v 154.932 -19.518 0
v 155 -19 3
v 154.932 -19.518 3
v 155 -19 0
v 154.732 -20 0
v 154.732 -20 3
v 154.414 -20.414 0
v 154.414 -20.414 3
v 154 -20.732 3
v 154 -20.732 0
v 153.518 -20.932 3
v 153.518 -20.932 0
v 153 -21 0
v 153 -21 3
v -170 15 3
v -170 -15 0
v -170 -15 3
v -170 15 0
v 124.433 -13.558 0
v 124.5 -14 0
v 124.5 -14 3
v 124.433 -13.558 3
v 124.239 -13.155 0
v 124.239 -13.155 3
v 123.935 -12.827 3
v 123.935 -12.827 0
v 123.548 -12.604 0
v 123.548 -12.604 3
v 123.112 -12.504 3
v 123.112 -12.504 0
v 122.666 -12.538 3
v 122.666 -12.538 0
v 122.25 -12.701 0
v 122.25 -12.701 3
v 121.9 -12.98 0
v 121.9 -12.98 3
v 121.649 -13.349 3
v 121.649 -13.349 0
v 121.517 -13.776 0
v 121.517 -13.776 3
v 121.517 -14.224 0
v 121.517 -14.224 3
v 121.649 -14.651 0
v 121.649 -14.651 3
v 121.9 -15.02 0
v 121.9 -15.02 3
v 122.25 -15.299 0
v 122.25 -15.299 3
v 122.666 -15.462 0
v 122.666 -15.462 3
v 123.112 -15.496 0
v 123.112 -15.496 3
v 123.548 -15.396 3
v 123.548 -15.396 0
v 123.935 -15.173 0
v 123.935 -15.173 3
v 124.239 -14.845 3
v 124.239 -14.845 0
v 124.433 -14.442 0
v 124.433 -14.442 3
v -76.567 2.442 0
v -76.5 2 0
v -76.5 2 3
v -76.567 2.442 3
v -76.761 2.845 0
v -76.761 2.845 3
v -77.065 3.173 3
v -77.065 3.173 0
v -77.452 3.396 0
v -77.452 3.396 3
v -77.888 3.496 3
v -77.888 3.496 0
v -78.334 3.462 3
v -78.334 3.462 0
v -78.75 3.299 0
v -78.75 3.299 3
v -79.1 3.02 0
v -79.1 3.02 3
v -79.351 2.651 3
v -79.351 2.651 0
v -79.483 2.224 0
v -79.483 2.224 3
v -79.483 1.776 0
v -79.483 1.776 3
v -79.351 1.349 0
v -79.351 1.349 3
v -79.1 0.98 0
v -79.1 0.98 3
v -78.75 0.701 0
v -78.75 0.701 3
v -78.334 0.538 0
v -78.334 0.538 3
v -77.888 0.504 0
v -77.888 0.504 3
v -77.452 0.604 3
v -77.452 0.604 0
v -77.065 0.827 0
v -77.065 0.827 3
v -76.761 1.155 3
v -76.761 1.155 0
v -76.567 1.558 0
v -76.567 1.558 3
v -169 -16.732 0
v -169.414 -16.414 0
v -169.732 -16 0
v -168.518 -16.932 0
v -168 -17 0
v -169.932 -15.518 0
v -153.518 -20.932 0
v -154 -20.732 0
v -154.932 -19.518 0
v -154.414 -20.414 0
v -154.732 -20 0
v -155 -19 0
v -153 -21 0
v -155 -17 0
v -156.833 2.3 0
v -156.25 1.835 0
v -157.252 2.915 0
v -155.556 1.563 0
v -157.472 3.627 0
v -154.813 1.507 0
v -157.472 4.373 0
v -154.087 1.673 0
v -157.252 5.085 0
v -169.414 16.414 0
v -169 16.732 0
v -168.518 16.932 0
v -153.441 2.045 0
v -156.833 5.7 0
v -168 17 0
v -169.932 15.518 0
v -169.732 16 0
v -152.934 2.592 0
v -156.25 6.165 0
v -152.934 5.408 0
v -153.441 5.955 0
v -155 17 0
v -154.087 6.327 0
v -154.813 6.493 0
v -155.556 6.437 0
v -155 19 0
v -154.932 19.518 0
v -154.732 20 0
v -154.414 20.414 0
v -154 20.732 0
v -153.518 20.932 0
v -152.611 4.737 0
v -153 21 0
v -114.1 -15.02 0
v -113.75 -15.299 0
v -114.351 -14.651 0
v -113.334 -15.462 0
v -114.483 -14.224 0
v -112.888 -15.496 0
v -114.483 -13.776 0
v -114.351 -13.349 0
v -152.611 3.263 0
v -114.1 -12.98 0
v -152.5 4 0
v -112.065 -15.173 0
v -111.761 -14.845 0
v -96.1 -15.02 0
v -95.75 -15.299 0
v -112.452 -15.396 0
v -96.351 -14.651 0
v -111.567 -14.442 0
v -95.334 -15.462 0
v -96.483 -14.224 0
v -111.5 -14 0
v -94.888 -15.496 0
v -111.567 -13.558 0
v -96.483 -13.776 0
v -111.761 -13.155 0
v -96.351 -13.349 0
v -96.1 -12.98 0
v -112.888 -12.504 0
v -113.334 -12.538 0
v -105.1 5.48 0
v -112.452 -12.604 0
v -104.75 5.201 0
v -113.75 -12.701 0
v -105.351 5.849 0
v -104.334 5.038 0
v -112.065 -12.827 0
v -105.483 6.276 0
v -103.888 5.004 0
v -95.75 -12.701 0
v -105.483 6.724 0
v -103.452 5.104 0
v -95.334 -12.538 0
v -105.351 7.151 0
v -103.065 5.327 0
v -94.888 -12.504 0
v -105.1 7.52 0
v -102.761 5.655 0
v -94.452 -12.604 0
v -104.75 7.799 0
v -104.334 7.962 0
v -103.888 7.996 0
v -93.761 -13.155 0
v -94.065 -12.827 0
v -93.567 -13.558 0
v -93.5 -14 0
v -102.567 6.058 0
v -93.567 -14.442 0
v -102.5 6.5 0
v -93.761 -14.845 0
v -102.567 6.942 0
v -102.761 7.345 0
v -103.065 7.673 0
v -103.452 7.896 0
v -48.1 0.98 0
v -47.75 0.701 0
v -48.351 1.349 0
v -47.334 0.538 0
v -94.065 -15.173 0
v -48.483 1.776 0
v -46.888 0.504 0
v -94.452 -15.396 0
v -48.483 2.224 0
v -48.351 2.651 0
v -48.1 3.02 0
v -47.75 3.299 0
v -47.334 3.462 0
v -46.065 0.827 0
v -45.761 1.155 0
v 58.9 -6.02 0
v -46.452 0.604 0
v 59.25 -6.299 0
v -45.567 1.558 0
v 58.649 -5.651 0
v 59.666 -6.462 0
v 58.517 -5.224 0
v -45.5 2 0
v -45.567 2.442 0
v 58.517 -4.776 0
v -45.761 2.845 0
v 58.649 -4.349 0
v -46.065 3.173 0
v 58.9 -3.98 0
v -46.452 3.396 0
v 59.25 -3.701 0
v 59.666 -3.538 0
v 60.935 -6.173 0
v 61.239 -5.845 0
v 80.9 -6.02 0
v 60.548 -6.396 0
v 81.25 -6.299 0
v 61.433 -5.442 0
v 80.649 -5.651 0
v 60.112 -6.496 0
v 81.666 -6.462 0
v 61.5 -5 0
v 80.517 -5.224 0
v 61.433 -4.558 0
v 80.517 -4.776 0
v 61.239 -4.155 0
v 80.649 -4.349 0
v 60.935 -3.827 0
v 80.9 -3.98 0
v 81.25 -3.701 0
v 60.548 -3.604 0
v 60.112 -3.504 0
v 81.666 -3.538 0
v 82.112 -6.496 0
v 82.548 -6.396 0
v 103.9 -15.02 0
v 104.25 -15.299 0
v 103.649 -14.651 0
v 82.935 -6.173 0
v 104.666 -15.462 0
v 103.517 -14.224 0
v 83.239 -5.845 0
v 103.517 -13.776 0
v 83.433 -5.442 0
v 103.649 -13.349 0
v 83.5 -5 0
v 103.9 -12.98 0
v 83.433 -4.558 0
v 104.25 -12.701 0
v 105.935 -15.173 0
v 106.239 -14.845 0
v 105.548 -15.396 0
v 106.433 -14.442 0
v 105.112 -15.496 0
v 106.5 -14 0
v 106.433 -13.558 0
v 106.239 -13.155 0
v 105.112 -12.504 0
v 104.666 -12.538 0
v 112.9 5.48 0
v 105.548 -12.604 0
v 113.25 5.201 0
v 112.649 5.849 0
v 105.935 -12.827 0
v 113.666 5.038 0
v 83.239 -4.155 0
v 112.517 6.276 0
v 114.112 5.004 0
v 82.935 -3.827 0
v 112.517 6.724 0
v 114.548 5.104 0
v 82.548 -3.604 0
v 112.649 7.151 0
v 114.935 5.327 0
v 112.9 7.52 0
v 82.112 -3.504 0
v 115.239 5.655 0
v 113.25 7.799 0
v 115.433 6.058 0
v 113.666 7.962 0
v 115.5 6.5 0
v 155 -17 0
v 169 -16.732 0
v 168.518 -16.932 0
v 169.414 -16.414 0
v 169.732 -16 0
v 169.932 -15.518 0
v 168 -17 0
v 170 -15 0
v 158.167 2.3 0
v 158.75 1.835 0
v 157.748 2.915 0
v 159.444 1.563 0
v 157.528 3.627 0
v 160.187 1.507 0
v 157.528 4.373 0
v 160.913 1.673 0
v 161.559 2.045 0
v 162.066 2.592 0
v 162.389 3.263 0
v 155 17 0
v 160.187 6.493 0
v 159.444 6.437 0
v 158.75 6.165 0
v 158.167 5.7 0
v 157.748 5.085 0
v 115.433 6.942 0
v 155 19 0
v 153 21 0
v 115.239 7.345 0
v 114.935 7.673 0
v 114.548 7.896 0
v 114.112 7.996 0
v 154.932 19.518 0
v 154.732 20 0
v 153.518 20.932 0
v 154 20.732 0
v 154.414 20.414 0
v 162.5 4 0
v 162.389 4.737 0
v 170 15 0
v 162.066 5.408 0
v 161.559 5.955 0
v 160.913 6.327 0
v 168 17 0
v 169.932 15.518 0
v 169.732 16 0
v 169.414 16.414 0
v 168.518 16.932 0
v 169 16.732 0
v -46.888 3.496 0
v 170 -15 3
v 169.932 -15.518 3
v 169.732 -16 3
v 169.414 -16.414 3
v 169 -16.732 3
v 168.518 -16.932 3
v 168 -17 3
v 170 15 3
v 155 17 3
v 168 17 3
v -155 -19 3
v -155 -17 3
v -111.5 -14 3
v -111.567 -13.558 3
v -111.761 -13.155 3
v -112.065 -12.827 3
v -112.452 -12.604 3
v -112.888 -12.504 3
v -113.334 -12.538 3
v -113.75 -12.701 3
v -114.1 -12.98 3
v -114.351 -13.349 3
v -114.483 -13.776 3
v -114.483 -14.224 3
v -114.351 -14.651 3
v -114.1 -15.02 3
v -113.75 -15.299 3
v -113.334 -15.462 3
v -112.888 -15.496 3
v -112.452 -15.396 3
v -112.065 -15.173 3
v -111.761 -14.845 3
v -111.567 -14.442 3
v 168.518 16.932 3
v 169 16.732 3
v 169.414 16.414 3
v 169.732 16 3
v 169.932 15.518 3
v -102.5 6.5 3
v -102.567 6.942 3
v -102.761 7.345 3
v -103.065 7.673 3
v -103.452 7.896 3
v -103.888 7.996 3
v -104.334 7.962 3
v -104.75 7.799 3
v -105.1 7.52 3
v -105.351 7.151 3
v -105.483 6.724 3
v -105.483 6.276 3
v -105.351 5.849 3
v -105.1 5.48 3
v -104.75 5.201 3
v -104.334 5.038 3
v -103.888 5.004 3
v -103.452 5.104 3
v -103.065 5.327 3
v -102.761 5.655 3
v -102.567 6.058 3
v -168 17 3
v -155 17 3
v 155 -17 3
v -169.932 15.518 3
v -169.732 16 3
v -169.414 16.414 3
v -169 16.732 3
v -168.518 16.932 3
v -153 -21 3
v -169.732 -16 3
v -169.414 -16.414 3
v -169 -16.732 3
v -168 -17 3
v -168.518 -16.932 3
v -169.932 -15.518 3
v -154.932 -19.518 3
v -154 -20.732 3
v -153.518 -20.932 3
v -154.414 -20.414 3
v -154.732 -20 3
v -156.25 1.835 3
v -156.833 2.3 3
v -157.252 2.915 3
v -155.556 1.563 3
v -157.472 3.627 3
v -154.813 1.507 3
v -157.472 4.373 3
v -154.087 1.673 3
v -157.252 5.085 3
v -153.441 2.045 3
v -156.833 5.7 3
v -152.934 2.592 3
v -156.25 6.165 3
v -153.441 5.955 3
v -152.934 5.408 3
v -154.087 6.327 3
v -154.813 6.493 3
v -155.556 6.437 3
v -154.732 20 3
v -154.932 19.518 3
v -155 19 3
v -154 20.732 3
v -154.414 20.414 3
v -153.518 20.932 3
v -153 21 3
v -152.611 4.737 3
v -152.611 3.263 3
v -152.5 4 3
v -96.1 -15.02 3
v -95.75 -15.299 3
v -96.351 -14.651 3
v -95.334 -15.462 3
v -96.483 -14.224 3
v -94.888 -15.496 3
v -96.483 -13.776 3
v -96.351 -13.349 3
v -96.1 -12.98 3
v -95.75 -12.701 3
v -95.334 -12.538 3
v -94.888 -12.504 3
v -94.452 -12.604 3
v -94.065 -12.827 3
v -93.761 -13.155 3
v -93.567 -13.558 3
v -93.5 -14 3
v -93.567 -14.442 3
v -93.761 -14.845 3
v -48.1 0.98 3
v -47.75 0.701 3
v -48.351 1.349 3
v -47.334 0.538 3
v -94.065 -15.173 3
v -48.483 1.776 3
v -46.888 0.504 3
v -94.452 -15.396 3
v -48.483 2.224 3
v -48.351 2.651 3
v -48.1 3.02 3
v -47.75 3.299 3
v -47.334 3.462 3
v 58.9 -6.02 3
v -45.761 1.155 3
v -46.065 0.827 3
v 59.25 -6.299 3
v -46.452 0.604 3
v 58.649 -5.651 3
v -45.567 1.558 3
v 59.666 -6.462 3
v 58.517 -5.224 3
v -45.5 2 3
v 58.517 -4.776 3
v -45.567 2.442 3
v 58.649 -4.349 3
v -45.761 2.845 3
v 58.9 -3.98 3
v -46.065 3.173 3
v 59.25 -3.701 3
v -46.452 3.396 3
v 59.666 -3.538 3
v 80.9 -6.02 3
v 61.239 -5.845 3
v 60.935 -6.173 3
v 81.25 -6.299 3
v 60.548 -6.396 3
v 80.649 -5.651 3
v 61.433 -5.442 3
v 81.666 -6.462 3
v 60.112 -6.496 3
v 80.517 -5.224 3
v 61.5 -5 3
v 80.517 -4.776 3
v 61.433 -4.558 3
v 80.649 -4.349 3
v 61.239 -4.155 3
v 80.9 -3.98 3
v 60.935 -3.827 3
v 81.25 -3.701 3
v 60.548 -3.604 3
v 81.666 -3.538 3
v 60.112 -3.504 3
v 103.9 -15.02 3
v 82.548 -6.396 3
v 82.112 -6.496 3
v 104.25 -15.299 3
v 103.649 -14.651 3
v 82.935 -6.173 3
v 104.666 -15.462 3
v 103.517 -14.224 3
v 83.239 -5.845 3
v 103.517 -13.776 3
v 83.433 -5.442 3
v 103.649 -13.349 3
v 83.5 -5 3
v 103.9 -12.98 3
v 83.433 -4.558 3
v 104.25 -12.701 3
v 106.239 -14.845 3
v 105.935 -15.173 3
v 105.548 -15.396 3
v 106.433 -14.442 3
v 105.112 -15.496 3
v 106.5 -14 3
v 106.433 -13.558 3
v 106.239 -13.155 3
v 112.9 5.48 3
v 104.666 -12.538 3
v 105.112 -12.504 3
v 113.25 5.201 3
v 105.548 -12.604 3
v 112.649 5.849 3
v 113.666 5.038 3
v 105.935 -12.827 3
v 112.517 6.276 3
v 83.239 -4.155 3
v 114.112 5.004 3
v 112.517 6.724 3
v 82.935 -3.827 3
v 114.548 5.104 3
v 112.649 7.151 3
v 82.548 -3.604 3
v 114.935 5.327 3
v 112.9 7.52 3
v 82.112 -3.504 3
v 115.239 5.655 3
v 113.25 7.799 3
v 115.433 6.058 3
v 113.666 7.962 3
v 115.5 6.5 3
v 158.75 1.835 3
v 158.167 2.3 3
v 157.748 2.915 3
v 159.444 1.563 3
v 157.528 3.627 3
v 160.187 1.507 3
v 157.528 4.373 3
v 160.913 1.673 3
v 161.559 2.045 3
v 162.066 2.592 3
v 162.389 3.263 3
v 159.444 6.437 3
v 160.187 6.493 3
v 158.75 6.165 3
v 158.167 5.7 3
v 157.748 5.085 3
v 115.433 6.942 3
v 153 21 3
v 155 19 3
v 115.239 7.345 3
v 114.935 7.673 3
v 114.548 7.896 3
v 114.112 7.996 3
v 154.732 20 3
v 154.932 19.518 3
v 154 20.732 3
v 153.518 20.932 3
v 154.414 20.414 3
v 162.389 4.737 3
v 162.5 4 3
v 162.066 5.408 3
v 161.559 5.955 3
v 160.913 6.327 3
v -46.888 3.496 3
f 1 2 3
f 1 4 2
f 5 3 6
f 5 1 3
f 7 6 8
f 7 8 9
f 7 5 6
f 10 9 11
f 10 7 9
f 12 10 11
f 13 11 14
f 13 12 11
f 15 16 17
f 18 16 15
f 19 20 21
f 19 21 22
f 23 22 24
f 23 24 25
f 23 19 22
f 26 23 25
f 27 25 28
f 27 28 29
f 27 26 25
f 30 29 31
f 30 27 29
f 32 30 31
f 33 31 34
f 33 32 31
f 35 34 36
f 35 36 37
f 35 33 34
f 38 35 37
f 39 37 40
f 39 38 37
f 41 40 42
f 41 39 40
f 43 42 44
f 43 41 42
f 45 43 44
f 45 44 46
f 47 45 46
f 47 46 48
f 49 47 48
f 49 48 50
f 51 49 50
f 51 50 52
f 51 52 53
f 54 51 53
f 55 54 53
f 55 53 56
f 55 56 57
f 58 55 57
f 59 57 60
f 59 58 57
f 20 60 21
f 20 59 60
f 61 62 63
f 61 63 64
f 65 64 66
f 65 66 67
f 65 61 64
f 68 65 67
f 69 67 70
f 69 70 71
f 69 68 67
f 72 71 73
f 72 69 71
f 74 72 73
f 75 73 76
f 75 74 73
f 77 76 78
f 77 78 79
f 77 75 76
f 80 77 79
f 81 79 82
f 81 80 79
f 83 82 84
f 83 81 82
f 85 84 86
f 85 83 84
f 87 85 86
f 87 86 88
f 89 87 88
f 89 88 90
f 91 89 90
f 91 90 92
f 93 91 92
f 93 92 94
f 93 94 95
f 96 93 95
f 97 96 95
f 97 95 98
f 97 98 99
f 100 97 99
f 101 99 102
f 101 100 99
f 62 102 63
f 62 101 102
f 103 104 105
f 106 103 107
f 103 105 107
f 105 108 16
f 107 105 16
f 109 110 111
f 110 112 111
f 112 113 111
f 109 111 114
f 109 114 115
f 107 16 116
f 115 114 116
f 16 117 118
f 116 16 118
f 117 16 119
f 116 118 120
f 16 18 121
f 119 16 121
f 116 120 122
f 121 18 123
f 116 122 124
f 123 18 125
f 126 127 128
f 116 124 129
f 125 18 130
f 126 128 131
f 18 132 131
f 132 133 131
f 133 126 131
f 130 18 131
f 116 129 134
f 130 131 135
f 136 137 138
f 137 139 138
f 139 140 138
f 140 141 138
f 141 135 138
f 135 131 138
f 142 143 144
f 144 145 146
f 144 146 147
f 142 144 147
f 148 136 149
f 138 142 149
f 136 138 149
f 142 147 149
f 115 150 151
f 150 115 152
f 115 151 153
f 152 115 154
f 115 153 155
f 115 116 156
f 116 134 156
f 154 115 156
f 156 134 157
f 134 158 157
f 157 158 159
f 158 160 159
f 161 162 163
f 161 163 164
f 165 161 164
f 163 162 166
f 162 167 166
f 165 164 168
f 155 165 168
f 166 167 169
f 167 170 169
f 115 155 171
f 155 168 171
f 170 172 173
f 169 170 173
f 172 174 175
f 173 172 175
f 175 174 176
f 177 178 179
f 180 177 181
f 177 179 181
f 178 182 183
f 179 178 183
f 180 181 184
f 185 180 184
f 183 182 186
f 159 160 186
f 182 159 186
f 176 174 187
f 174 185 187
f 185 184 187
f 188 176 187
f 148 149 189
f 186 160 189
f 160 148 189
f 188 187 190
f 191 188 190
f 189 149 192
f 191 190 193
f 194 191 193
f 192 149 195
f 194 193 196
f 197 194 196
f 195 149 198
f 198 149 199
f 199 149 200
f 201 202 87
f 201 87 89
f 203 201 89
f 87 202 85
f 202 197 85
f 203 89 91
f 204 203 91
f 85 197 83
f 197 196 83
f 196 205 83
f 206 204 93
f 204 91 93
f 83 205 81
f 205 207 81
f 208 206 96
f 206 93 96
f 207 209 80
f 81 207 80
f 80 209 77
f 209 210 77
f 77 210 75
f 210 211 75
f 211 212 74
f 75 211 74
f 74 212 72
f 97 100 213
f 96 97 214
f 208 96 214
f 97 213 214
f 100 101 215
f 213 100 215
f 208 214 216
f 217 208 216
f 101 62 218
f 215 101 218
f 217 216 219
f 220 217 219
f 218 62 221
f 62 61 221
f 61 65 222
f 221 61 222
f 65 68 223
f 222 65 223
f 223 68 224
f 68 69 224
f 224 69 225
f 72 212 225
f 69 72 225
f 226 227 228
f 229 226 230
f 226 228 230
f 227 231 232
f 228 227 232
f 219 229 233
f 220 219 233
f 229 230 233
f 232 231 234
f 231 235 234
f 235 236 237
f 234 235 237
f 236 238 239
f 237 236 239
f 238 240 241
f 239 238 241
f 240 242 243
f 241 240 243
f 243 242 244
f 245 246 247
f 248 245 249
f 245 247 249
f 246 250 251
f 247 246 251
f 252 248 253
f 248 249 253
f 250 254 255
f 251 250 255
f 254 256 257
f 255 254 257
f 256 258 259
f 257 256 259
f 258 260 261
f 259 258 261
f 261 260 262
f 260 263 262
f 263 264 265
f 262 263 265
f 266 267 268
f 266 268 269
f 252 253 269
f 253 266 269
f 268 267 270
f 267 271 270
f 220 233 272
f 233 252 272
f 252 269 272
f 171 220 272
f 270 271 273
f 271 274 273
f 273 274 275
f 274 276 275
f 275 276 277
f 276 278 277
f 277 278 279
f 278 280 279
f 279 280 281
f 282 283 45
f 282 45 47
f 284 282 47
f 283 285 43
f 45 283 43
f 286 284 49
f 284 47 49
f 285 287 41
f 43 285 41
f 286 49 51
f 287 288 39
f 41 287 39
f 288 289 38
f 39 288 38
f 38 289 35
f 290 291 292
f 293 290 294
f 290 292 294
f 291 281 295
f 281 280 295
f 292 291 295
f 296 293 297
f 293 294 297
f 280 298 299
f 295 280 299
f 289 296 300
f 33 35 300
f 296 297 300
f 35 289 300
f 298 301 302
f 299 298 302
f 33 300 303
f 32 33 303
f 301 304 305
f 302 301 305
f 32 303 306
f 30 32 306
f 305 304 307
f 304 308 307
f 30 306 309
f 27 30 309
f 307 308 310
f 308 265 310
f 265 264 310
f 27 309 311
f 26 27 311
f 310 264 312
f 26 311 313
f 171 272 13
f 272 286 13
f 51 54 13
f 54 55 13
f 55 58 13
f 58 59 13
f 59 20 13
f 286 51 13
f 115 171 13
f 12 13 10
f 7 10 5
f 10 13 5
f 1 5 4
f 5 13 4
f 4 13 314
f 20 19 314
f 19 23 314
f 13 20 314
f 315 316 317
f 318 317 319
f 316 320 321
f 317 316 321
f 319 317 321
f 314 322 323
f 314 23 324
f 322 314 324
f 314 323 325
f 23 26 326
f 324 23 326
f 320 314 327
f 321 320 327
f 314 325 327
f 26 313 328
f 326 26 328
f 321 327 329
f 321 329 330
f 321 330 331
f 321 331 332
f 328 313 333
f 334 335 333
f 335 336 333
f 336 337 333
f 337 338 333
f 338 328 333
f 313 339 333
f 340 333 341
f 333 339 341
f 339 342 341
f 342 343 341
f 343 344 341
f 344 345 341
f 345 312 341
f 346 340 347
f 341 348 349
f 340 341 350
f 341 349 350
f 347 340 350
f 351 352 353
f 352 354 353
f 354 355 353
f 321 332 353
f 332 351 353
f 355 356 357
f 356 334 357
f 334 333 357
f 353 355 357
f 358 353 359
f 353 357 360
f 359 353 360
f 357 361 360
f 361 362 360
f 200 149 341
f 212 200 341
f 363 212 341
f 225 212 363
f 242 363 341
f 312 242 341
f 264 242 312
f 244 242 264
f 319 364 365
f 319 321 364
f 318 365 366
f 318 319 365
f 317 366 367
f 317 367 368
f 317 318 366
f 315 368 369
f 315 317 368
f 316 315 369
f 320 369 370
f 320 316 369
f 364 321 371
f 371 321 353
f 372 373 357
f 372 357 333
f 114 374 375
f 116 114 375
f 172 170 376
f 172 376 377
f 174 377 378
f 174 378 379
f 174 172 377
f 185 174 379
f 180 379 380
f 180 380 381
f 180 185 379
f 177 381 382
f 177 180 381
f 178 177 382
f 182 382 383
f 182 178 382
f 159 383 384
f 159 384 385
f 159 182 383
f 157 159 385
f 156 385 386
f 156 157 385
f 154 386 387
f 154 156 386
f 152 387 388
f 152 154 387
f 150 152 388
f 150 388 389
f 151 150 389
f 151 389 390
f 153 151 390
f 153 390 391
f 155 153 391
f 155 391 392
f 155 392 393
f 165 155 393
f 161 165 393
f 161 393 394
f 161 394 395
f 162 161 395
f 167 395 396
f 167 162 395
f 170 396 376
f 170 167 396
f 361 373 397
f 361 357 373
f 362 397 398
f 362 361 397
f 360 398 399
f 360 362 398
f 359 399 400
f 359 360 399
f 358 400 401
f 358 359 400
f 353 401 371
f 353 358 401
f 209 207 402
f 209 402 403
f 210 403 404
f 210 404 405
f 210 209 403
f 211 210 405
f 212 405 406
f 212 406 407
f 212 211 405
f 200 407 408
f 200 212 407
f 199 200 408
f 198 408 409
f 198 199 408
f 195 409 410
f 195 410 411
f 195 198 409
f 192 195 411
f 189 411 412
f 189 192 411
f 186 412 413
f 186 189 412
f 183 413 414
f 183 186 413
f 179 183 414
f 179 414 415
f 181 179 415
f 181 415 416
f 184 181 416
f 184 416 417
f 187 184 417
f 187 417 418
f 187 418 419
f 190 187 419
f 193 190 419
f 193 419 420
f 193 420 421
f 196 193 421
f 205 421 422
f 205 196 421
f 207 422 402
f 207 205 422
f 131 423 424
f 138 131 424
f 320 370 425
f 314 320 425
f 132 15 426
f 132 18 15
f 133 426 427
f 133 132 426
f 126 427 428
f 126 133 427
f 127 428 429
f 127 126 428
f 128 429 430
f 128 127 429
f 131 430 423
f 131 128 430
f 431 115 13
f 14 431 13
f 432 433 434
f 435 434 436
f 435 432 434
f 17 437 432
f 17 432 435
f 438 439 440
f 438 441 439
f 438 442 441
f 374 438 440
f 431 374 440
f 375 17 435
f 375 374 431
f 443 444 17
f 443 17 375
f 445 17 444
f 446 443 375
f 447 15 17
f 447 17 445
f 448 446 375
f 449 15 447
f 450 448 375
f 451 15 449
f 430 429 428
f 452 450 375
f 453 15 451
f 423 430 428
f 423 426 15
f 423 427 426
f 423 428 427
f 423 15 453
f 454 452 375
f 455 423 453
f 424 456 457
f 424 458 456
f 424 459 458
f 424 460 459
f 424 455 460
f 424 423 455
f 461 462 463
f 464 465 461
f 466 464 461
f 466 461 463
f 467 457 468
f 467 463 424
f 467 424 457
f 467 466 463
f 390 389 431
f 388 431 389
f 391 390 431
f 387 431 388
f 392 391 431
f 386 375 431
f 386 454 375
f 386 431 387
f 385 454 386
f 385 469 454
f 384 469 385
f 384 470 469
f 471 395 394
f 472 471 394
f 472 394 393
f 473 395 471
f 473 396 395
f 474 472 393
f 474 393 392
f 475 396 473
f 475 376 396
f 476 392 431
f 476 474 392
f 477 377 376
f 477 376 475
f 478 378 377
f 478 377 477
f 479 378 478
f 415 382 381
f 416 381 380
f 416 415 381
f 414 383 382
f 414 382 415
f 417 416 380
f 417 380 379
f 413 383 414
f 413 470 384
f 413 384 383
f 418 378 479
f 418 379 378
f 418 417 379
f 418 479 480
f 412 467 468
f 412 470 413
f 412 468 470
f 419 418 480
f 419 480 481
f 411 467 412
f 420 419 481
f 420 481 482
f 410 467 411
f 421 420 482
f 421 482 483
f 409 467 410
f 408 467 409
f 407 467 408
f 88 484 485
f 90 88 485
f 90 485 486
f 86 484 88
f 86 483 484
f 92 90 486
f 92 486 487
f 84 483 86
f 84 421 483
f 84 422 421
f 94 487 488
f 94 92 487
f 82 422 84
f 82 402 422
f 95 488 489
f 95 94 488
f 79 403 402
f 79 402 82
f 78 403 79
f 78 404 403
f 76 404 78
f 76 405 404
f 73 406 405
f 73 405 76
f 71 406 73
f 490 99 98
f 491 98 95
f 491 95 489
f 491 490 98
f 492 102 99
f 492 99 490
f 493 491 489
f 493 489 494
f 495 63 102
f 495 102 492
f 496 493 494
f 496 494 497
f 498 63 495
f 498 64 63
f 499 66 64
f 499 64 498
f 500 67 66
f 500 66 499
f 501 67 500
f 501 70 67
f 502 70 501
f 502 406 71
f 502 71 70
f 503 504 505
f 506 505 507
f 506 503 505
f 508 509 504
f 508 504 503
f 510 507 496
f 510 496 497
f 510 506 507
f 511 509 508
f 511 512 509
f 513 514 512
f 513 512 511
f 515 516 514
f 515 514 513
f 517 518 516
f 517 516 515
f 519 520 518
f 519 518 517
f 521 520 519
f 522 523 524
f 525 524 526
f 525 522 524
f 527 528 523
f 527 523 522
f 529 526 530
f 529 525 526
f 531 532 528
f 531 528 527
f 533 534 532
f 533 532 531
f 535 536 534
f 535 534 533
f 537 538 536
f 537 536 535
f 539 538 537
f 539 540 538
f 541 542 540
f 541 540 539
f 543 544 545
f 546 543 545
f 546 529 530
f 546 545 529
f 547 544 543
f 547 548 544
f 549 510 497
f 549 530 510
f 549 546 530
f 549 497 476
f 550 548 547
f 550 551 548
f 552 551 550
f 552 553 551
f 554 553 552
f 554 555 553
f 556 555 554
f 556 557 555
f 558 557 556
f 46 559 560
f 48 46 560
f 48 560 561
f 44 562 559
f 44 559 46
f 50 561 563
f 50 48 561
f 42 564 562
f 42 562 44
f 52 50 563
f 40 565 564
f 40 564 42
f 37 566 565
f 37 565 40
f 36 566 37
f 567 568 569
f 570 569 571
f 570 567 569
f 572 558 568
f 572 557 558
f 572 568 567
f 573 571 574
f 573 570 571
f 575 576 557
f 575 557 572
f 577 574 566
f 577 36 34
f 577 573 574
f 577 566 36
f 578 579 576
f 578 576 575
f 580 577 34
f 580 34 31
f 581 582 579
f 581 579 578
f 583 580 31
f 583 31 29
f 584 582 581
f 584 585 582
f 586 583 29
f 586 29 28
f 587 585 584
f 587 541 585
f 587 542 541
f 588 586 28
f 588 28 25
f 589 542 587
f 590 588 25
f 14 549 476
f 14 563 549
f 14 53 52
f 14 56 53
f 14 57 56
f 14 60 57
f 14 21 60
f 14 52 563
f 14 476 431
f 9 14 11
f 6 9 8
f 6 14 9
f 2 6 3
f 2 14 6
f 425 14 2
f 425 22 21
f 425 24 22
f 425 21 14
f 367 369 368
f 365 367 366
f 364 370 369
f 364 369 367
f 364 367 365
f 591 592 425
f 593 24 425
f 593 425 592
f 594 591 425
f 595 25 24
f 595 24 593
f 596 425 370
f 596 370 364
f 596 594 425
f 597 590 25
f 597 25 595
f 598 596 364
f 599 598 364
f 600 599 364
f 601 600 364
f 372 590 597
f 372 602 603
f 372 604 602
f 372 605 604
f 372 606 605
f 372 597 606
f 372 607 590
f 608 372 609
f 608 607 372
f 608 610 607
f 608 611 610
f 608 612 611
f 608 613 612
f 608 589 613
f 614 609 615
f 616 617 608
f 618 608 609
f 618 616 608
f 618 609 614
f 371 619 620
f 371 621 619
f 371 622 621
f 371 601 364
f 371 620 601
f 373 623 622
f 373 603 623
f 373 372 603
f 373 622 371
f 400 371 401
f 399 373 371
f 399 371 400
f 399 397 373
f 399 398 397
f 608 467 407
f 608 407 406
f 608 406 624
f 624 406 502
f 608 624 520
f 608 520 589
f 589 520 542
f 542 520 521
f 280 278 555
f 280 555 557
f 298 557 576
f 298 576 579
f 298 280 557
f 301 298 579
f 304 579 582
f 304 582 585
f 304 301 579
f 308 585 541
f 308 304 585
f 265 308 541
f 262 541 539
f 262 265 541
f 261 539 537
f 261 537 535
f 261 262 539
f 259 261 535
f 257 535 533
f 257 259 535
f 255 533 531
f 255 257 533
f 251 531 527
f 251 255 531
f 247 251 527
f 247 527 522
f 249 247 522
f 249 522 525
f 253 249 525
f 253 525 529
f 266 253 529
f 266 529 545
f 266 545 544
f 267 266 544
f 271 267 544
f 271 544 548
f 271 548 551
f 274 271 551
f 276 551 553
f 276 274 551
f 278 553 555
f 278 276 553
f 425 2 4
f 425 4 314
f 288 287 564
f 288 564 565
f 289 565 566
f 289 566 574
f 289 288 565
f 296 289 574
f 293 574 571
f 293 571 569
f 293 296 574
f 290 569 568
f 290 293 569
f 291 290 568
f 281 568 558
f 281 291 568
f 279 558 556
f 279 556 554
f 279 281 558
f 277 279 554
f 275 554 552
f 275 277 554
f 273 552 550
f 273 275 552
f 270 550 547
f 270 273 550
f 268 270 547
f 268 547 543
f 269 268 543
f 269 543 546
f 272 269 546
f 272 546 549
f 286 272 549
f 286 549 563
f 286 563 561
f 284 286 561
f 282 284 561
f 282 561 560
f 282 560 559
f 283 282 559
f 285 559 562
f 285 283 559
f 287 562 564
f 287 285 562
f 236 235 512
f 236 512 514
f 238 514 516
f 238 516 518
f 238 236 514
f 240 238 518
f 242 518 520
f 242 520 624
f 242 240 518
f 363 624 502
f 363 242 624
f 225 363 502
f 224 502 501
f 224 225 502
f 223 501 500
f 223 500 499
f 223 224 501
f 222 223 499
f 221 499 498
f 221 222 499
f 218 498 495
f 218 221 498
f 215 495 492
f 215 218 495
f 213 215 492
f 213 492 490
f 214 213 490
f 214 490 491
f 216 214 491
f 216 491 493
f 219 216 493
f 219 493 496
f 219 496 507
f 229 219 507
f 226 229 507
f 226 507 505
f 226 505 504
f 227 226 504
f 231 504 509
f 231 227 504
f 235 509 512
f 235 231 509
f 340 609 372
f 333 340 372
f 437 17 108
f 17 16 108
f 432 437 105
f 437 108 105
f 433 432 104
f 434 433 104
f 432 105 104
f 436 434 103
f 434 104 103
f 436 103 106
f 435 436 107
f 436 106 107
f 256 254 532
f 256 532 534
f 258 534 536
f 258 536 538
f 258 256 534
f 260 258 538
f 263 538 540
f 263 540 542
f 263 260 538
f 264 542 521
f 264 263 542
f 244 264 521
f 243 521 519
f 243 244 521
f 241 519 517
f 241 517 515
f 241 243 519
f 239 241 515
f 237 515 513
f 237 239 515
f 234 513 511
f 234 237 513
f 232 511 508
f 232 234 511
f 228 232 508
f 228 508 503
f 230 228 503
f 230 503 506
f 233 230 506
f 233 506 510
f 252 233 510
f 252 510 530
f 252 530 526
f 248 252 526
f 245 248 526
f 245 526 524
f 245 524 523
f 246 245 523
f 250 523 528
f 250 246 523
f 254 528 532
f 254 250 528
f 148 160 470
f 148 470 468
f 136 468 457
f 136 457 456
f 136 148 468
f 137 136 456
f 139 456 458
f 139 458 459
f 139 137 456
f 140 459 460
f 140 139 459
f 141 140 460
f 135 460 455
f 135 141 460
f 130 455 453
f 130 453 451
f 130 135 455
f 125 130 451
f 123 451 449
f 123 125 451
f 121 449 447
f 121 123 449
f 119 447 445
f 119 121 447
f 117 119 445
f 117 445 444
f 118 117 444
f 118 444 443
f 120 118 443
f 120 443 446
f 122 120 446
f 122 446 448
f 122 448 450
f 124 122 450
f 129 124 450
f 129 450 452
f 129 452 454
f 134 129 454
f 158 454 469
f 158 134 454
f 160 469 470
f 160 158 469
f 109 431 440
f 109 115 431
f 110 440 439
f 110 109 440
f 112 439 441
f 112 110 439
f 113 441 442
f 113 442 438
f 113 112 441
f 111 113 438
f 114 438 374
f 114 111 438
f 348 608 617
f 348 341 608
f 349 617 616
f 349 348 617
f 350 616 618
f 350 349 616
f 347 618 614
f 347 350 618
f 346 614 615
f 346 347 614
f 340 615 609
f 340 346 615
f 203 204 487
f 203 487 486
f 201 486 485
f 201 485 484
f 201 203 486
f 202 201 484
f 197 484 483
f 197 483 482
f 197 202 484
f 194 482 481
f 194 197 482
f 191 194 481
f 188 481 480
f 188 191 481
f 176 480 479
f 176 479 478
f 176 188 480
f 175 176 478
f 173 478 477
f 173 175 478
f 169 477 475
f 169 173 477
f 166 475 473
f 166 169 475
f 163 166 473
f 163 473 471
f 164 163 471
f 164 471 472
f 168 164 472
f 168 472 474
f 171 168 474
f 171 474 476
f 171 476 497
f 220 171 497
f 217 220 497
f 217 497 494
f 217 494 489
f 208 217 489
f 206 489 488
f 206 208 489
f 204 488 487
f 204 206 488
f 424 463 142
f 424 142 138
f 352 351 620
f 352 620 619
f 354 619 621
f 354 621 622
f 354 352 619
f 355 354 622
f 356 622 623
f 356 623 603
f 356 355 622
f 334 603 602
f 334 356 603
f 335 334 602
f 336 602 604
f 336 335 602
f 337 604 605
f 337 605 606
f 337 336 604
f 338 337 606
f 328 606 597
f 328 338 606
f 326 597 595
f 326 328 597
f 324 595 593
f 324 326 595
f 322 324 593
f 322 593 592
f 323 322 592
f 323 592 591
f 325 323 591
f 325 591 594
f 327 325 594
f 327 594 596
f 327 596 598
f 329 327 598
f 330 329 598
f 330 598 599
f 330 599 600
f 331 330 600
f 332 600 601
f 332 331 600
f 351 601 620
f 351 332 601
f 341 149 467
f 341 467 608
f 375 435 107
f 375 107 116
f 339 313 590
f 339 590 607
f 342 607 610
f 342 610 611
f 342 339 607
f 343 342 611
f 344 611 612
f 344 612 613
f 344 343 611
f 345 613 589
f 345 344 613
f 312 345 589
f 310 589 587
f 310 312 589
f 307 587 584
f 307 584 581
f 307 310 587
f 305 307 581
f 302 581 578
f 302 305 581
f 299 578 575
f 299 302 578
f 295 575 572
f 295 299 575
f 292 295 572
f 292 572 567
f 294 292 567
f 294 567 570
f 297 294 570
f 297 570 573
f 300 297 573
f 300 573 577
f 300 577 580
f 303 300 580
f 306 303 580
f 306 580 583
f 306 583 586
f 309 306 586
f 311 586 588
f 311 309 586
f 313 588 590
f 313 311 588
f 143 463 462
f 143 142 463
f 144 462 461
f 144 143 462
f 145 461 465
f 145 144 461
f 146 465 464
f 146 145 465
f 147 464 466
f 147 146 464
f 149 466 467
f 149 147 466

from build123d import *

# Parameters (mm, degrees)
CROQUIS1_W                                 = 340
CROQUIS1_H                                 = 42
CROQUIS1_R                                 = 1.5
CROQUIS1_R_2                               = 2.5
SALIENTE_EXTRUIR1_DEPTH                    = 3
CROQUIS2_W                                 = 15
CROQUIS2_H                                 = 4
CORTAR_EXTRUIR2_DEPTH                      = 172.31841699
SIMETR_A4_AT_THE_SECOND_PLANE_COPY_1_SKE_W = 15
SIMETR_A4_AT_THE_SECOND_PLANE_COPY_1_SKE_H = 4
SIMETR_A4_AT_THE_SECOND_PLANE_COPY_1_DEPTH = 172.31841699
REDONDEO1_R                                = 2


with BuildPart() as part:
    # Croquis1 → Saliente-Extruir1 (new body)
    with BuildSketch(Plane.XY):
        Rectangle(CROQUIS1_W, CROQUIS1_H)
        with Locations((-47, 2)):
            Circle(CROQUIS1_R, mode=Mode.SUBTRACT)
        with Locations((-78, 2)):
            Circle(CROQUIS1_R, mode=Mode.SUBTRACT)
        with Locations((-104, 6.5)):
            Circle(CROQUIS1_R, mode=Mode.SUBTRACT)
        with Locations((-113, -14)):
            Circle(CROQUIS1_R, mode=Mode.SUBTRACT)
        with Locations((-95, -14)):
            Circle(CROQUIS1_R, mode=Mode.SUBTRACT)
        with Locations((-155, 4)):
            Circle(CROQUIS1_R_2, mode=Mode.SUBTRACT)
        with Locations((160, 4)):
            Circle(CROQUIS1_R_2, mode=Mode.SUBTRACT)
        with Locations((114, 6.5)):
            Circle(CROQUIS1_R, mode=Mode.SUBTRACT)
        with Locations((105, -14)):
            Circle(CROQUIS1_R, mode=Mode.SUBTRACT)
        with Locations((123, -14)):
            Circle(CROQUIS1_R, mode=Mode.SUBTRACT)
        with Locations((82, -5)):
            Circle(CROQUIS1_R, mode=Mode.SUBTRACT)
        with Locations((60, -5)):
            Circle(CROQUIS1_R, mode=Mode.SUBTRACT)
    extrude(amount=SALIENTE_EXTRUIR1_DEPTH)

    # Croquis2 → Cortar-Extruir2 (cut, through all)
    with BuildSketch(Plane.XY.offset(3)):
        with Locations((-162.5, -19)):
            Rectangle(CROQUIS2_W, CROQUIS2_H)
    cortar_extruir2 = extrude(amount=-CORTAR_EXTRUIR2_DEPTH, mode=Mode.SUBTRACT)

    # Simetría4: Cortar-Extruir2 across plane
    add(cortar_extruir2.mirror(Plane(origin=(0, 0, 0), x_dir=(0, 0, 1), z_dir=(1, 0, 0))), mode=Mode.SUBTRACT)

    # Simetría4 at the second plane: Cortar-Extruir2 across plane
    add(cortar_extruir2.mirror(Plane.ZX), mode=Mode.SUBTRACT)

    # Simetría4 at the second plane copy 1 ske → Simetría4 at the second plane copy 1 (cut, through all)
    with BuildSketch(Plane(origin=(0, 0, 3), x_dir=(-1, 0, 0), z_dir=(0, 0, 1))):
        with Locations((-162.5, -19)):
            Rectangle(SIMETR_A4_AT_THE_SECOND_PLANE_COPY_1_SKE_W, SIMETR_A4_AT_THE_SECOND_PLANE_COPY_1_SKE_H)
    extrude(amount=-SIMETR_A4_AT_THE_SECOND_PLANE_COPY_1_DEPTH, mode=Mode.SUBTRACT)

    # Redondeo1
    redondeo1_edges = [part.edges().sort_by_distance(p)[0] for p in [
        (155, -21, 1.5),
        (170, 17, 1.5),
        (155, 21, 1.5),
        (-170, -17, 1.5),
        (-155, -21, 1.5),
        (-170, 17, 1.5),
        (-155, 21, 1.5),
        (170, -17, 1.5),
    ]]
    fillet(redondeo1_edges, radius=REDONDEO1_R)


solid = part.part
